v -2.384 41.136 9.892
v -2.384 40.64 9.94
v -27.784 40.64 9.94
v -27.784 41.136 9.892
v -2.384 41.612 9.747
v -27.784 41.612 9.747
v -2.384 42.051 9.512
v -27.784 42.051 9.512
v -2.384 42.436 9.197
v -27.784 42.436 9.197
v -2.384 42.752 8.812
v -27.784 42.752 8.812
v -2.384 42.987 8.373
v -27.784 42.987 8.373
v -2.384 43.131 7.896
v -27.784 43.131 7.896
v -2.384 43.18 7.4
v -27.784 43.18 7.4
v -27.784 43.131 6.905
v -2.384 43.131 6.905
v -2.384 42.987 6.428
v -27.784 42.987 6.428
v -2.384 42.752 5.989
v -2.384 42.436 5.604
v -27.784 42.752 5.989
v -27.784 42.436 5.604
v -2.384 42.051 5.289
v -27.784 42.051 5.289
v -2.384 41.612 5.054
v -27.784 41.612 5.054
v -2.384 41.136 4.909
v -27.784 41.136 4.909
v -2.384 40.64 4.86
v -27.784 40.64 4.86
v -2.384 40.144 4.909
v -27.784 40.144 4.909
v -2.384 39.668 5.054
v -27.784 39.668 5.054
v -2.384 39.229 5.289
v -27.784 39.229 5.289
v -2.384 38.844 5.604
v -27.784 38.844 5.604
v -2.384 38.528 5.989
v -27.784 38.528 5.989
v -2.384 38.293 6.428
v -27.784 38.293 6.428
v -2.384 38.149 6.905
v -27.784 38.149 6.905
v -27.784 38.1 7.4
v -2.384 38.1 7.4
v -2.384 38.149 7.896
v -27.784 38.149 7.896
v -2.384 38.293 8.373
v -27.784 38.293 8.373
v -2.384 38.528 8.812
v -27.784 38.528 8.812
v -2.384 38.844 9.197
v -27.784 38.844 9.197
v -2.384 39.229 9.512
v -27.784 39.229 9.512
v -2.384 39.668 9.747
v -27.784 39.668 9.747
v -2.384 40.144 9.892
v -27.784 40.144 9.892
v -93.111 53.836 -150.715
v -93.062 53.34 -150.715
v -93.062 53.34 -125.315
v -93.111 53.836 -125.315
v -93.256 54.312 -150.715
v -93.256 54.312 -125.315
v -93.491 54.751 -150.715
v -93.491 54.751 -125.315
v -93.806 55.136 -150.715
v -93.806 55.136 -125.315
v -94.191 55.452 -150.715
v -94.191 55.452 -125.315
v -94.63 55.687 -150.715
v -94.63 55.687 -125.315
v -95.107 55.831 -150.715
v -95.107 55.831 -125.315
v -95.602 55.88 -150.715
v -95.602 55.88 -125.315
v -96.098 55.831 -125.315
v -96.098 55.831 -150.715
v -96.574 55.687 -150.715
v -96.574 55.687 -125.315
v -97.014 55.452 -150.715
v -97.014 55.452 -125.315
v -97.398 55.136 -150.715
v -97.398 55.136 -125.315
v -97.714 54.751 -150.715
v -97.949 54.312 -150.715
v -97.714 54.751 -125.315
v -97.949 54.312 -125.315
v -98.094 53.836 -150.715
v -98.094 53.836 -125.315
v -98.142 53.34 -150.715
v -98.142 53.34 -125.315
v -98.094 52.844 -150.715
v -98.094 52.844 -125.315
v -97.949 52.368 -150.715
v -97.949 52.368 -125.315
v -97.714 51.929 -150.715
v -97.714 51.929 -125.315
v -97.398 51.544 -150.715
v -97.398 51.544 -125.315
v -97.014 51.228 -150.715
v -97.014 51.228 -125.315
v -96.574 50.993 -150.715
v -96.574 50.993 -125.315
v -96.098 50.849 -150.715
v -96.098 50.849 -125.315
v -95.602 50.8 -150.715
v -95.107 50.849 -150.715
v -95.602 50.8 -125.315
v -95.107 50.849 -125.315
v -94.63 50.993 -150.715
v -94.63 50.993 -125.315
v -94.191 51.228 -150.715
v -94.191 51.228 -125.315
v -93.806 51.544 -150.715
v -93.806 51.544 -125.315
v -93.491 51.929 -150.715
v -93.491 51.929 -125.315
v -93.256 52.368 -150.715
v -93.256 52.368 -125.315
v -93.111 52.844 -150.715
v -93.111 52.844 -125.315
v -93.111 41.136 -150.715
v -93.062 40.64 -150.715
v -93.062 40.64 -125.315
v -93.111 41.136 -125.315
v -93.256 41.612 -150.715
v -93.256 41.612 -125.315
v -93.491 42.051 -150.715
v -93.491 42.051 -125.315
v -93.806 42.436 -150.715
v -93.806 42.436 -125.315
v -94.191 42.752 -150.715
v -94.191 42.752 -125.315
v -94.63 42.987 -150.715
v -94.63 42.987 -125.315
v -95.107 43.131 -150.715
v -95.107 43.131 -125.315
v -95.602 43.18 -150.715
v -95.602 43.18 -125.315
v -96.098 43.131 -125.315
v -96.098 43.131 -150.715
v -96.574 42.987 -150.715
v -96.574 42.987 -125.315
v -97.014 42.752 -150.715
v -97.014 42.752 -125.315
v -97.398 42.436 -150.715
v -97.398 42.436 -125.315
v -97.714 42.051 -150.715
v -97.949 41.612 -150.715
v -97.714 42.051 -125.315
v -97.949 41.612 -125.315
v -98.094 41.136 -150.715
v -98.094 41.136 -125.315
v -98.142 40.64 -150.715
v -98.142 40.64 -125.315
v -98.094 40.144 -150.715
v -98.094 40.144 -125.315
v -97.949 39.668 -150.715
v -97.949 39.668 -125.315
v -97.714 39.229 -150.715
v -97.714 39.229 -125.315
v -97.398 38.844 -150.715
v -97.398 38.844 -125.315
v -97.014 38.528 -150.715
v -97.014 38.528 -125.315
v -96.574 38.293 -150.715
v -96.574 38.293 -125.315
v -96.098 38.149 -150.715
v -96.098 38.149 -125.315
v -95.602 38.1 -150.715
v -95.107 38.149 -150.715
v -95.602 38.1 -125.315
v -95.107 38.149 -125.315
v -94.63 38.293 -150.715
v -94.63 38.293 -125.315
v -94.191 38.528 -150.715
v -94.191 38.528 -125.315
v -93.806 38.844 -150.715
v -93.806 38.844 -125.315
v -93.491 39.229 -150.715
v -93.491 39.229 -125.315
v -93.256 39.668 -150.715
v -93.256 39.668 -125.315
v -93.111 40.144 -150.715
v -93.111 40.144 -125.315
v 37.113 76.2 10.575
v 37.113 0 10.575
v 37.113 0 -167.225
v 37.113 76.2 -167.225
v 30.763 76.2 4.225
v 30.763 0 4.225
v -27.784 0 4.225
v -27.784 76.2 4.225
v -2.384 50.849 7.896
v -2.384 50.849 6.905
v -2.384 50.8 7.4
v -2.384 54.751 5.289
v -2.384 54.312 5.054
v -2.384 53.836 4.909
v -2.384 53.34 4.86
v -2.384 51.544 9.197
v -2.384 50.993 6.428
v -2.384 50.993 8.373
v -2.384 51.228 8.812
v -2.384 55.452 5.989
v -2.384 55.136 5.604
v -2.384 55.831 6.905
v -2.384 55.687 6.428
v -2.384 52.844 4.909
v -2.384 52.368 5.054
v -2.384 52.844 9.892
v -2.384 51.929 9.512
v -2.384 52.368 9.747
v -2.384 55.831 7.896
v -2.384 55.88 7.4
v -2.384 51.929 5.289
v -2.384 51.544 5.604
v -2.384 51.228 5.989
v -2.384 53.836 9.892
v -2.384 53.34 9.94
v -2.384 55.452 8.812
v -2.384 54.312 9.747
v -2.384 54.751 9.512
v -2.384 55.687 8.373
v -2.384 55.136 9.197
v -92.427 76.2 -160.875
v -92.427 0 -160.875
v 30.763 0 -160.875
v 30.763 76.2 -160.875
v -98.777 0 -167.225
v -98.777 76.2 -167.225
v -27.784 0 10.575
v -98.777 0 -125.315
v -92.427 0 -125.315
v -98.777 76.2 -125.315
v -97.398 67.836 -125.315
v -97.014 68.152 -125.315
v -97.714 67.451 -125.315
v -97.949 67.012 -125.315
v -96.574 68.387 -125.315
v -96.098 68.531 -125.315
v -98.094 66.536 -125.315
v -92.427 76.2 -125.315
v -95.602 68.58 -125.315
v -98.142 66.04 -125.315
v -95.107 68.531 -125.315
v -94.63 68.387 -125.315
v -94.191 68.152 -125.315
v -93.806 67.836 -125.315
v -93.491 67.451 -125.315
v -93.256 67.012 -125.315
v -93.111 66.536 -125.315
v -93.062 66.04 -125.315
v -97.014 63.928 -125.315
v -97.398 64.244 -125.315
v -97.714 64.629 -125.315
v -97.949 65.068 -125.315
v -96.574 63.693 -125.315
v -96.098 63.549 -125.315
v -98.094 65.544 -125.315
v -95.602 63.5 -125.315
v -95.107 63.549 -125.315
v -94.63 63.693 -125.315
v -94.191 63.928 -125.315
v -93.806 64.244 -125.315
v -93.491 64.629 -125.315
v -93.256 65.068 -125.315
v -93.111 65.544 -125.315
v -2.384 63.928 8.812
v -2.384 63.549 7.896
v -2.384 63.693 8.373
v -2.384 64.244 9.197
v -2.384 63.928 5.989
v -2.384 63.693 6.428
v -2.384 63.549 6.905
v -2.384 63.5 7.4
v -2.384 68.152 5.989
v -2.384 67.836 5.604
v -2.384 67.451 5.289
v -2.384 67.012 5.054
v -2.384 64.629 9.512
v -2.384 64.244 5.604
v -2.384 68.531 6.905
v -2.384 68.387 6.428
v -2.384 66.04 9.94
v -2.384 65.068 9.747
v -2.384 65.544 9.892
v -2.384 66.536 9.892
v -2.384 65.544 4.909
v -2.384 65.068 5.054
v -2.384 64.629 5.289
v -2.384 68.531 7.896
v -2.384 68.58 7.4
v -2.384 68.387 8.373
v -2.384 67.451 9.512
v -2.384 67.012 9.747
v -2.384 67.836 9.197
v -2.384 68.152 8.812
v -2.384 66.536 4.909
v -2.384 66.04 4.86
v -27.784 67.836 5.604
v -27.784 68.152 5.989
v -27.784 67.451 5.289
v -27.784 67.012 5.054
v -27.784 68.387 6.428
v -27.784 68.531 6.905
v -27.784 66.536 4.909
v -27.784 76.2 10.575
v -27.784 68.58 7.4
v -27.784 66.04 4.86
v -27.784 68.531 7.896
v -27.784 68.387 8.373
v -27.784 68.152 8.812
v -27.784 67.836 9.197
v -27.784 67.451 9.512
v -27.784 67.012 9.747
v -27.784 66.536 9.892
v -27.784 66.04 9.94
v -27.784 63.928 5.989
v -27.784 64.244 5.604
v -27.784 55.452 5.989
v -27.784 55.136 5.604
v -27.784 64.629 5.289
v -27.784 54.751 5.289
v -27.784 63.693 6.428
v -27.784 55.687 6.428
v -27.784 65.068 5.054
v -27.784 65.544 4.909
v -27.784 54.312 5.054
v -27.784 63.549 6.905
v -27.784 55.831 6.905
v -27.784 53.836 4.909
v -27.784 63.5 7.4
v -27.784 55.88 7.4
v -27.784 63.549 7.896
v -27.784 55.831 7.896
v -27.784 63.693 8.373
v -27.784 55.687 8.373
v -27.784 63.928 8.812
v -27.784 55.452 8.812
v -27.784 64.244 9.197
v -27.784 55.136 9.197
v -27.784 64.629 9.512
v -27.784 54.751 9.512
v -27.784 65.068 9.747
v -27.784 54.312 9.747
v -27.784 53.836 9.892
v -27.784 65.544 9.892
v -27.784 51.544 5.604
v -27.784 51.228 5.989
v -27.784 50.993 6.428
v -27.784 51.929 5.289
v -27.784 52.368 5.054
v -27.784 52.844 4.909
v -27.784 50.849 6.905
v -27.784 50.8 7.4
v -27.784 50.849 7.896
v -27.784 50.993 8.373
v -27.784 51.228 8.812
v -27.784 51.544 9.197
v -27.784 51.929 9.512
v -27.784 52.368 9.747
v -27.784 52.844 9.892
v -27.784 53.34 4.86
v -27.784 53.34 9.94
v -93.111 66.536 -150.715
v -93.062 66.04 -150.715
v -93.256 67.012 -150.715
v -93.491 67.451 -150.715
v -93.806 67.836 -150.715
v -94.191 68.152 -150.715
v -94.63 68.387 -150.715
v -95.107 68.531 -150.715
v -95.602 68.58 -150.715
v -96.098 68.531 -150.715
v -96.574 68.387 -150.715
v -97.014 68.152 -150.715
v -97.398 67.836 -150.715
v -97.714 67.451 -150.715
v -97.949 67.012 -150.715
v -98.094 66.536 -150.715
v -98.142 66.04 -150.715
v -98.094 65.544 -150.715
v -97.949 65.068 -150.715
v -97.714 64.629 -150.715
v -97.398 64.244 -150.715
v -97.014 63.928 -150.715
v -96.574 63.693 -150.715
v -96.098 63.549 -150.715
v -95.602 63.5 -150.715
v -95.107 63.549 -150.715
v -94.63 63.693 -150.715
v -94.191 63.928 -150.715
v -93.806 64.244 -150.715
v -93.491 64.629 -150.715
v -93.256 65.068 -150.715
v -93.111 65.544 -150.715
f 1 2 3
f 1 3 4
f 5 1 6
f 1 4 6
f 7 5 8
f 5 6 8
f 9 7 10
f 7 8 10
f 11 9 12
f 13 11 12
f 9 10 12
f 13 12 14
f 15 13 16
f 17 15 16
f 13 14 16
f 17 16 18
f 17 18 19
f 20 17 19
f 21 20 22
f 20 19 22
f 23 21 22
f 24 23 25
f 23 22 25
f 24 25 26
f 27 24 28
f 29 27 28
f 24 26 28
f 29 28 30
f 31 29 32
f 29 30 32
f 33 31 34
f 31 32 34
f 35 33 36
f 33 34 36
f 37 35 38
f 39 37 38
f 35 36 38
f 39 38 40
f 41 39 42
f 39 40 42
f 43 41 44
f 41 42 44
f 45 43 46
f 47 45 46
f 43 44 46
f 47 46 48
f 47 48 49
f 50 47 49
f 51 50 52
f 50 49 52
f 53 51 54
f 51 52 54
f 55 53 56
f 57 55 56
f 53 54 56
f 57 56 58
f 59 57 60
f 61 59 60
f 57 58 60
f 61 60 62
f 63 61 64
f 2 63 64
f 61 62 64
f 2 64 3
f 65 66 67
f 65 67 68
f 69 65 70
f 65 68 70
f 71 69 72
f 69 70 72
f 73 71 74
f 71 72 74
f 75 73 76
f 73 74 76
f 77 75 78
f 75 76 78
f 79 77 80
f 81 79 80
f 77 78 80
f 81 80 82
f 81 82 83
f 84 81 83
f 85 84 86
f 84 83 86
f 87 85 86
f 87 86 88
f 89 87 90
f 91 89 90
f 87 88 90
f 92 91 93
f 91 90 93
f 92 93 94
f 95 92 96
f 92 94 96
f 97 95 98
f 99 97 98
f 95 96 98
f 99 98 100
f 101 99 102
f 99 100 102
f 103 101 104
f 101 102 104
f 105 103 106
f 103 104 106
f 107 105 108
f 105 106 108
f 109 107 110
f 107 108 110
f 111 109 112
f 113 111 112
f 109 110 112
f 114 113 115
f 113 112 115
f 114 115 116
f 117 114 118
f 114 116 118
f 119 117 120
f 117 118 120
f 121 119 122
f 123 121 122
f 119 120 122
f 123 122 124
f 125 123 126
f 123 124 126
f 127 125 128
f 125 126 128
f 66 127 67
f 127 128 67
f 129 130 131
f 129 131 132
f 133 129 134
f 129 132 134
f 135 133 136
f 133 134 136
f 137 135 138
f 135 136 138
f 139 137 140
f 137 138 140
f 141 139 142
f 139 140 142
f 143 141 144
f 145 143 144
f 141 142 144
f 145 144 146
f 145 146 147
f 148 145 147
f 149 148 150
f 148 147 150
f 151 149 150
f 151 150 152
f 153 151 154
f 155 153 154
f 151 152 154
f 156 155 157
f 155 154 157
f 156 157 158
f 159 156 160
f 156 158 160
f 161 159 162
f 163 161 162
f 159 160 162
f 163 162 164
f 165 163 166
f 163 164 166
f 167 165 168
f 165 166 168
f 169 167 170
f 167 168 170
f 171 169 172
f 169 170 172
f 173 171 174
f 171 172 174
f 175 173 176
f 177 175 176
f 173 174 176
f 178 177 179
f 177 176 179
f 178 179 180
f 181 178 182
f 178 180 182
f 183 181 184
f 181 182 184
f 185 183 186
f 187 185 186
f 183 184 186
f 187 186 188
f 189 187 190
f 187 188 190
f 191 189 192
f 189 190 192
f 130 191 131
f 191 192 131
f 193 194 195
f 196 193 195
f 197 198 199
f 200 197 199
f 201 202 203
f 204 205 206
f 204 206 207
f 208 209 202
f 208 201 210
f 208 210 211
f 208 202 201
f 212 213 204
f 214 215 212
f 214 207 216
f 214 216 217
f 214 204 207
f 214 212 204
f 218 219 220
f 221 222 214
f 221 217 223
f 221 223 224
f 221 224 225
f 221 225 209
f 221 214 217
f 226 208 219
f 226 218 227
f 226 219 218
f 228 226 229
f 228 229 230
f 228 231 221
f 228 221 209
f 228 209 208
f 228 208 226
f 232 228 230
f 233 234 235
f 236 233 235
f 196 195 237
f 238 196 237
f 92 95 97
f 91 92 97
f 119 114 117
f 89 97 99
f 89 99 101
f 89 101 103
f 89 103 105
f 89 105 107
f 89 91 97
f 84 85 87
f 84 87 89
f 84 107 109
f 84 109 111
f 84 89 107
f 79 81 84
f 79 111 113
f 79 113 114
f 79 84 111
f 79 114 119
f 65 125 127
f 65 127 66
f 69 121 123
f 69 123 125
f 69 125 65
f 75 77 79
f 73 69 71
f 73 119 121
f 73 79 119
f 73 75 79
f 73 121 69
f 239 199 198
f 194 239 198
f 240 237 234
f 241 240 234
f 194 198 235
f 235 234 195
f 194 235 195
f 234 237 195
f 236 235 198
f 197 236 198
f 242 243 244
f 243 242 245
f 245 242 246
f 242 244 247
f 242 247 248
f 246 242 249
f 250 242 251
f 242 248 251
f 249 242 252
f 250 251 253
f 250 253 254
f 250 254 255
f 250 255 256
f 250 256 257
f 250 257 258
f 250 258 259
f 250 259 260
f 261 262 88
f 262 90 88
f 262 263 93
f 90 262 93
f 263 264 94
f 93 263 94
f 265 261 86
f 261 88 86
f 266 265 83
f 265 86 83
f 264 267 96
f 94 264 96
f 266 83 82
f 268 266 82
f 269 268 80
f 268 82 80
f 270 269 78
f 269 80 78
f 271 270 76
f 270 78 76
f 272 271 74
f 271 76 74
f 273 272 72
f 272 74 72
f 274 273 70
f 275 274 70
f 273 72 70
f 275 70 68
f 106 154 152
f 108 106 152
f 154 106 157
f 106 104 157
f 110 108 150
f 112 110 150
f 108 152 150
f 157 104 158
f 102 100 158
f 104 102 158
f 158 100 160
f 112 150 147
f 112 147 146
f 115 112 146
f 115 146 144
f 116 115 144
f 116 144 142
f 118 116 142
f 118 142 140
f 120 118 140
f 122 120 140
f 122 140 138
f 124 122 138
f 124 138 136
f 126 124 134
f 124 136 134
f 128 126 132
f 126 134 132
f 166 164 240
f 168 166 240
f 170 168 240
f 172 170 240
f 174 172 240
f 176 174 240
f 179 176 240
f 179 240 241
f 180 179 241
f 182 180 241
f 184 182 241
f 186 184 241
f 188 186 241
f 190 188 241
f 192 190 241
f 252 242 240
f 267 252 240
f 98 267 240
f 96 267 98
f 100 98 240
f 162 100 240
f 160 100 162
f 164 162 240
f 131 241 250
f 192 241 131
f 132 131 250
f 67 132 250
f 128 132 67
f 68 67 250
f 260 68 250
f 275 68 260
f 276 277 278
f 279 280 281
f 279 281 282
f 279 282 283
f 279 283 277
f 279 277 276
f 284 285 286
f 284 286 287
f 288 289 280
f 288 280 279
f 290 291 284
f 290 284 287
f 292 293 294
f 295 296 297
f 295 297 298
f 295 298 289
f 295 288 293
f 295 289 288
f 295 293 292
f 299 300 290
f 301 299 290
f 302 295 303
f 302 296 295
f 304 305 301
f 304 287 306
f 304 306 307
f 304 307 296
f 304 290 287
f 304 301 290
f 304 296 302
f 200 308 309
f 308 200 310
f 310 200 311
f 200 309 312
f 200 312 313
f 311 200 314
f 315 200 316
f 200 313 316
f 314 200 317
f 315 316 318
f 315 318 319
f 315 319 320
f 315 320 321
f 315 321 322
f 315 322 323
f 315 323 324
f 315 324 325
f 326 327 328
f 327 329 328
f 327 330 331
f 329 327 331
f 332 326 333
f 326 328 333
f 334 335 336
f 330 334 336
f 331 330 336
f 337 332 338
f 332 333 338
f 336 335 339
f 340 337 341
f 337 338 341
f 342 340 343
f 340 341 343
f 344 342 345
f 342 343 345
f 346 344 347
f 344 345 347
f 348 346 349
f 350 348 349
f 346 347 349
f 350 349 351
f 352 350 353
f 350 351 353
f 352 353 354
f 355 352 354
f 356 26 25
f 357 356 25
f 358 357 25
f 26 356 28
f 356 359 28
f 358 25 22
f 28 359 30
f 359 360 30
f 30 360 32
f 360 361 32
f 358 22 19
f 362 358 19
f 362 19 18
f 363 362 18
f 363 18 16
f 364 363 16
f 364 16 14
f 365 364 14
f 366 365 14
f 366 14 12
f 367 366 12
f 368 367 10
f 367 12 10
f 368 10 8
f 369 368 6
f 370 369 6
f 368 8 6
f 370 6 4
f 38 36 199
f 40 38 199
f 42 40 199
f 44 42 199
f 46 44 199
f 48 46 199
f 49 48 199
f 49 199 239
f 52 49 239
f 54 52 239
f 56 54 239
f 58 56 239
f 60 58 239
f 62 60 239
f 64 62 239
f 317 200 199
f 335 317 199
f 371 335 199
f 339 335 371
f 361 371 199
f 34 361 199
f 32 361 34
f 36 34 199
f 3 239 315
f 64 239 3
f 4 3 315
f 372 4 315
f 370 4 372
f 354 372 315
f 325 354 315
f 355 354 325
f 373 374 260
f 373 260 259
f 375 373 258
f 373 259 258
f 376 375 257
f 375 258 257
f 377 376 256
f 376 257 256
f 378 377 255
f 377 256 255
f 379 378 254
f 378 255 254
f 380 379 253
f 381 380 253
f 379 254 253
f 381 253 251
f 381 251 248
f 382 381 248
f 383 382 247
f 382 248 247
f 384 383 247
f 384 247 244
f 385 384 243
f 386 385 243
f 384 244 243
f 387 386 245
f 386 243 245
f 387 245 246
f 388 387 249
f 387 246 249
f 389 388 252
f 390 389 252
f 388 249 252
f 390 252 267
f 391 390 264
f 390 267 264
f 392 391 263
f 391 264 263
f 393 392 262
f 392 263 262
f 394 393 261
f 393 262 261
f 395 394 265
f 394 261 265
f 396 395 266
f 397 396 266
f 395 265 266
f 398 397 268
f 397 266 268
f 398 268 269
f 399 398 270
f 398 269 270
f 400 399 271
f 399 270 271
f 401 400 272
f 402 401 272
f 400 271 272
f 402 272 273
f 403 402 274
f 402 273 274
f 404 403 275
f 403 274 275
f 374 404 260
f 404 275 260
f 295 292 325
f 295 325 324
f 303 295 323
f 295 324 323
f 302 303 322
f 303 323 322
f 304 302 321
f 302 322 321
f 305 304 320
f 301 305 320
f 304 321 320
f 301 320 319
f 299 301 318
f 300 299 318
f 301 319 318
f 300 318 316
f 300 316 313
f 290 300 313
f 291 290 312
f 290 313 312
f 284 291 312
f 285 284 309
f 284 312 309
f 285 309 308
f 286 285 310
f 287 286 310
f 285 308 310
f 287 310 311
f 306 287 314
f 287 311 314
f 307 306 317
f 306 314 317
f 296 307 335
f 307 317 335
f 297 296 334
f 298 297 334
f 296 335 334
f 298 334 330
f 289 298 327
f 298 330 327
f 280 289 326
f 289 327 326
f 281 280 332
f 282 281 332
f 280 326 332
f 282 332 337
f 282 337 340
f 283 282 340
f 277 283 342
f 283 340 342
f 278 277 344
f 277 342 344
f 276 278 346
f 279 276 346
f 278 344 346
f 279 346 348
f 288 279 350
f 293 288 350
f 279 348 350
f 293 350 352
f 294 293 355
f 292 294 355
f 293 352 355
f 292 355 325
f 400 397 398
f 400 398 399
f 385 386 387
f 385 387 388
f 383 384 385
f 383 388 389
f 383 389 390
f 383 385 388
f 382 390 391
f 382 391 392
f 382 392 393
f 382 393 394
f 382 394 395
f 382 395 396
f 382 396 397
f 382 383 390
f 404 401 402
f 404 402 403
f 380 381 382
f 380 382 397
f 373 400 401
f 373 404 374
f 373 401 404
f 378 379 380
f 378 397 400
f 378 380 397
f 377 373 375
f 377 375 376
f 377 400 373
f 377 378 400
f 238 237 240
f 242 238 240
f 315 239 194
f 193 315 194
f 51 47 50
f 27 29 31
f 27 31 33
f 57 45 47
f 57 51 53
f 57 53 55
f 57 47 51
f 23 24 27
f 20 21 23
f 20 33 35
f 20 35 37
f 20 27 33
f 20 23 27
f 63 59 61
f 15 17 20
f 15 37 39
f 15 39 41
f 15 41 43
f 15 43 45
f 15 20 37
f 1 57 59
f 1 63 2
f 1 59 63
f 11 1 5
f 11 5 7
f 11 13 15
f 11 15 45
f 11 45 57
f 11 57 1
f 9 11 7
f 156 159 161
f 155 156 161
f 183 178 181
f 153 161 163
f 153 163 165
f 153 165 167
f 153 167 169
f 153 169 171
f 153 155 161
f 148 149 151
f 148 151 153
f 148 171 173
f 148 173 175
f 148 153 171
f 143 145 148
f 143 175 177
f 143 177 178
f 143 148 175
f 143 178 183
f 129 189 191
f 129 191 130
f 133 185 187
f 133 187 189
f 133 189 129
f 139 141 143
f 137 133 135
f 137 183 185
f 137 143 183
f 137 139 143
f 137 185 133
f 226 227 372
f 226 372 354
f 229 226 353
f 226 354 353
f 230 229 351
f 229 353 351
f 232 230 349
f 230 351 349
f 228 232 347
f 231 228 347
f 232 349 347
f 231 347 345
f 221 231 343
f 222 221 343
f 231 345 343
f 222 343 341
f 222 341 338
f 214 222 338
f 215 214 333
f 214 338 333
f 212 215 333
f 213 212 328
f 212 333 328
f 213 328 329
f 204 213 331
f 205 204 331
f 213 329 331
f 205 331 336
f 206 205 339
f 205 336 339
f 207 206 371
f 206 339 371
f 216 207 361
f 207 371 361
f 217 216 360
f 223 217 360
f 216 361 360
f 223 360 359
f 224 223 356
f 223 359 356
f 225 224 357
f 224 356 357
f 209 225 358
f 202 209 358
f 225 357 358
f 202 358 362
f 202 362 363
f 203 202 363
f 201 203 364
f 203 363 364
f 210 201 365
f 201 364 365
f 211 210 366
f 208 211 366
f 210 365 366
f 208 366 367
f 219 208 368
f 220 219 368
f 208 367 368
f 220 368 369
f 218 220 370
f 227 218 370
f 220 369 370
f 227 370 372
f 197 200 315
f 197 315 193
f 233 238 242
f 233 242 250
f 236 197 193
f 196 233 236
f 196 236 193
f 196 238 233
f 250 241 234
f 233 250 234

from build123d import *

# Parameters (mm, degrees)
BOSS_EXTRUDE1_DEPTH = 76.2
SKETCH4_R           = 2.54
CUT_EXTRUDE2_DEPTH  = 25.4
SKETCH6_R           = 2.54
CUT_EXTRUDE4_DEPTH  = 25.4


with BuildPart() as part:
    # Sketch1 → Boss-Extrude1 (new body)
    with BuildSketch(Plane(origin=(0, 0, 0), x_dir=(1, 0, 0), z_dir=(0, 1, 0))):
        Polygon((37.11256121, 167.224507406), (-98.77743879, 167.224507406), (-98.77743879, 125.314507406), (-92.42743879, 125.314507406), (-92.42743879, 160.874507406), (30.76256121, 160.874507406), (30.76256121, -4.225492594), (-27.78443879, -4.225492594), (-27.78443879, -10.575492594), (37.11256121, -10.575492594), align=None)
    extrude(amount=BOSS_EXTRUDE1_DEPTH)

    # Sketch4 → Cut-Extrude2 (cut)
    with BuildSketch(Plane.ZY.offset(27.78443879)):
        with Locations((7.400492594, 66.04)):
            Circle(SKETCH4_R)
        with Locations((7.400492594, 53.34)):
            Circle(SKETCH4_R)
        with Locations((7.400492594, 40.64)):
            Circle(SKETCH4_R)
    extrude(amount=-CUT_EXTRUDE2_DEPTH, mode=Mode.SUBTRACT)

    # Sketch6 → Cut-Extrude4 (cut)
    with BuildSketch(Plane.XY.offset(-125.314507406)):
        with Locations((-95.60243879, 66.04)):
            Circle(SKETCH6_R)
        with Locations((-95.60243879, 53.34)):
            Circle(SKETCH6_R)
        with Locations((-95.60243879, 40.64)):
            Circle(SKETCH6_R)
    extrude(amount=-CUT_EXTRUDE4_DEPTH, mode=Mode.SUBTRACT)


solid = part.part
